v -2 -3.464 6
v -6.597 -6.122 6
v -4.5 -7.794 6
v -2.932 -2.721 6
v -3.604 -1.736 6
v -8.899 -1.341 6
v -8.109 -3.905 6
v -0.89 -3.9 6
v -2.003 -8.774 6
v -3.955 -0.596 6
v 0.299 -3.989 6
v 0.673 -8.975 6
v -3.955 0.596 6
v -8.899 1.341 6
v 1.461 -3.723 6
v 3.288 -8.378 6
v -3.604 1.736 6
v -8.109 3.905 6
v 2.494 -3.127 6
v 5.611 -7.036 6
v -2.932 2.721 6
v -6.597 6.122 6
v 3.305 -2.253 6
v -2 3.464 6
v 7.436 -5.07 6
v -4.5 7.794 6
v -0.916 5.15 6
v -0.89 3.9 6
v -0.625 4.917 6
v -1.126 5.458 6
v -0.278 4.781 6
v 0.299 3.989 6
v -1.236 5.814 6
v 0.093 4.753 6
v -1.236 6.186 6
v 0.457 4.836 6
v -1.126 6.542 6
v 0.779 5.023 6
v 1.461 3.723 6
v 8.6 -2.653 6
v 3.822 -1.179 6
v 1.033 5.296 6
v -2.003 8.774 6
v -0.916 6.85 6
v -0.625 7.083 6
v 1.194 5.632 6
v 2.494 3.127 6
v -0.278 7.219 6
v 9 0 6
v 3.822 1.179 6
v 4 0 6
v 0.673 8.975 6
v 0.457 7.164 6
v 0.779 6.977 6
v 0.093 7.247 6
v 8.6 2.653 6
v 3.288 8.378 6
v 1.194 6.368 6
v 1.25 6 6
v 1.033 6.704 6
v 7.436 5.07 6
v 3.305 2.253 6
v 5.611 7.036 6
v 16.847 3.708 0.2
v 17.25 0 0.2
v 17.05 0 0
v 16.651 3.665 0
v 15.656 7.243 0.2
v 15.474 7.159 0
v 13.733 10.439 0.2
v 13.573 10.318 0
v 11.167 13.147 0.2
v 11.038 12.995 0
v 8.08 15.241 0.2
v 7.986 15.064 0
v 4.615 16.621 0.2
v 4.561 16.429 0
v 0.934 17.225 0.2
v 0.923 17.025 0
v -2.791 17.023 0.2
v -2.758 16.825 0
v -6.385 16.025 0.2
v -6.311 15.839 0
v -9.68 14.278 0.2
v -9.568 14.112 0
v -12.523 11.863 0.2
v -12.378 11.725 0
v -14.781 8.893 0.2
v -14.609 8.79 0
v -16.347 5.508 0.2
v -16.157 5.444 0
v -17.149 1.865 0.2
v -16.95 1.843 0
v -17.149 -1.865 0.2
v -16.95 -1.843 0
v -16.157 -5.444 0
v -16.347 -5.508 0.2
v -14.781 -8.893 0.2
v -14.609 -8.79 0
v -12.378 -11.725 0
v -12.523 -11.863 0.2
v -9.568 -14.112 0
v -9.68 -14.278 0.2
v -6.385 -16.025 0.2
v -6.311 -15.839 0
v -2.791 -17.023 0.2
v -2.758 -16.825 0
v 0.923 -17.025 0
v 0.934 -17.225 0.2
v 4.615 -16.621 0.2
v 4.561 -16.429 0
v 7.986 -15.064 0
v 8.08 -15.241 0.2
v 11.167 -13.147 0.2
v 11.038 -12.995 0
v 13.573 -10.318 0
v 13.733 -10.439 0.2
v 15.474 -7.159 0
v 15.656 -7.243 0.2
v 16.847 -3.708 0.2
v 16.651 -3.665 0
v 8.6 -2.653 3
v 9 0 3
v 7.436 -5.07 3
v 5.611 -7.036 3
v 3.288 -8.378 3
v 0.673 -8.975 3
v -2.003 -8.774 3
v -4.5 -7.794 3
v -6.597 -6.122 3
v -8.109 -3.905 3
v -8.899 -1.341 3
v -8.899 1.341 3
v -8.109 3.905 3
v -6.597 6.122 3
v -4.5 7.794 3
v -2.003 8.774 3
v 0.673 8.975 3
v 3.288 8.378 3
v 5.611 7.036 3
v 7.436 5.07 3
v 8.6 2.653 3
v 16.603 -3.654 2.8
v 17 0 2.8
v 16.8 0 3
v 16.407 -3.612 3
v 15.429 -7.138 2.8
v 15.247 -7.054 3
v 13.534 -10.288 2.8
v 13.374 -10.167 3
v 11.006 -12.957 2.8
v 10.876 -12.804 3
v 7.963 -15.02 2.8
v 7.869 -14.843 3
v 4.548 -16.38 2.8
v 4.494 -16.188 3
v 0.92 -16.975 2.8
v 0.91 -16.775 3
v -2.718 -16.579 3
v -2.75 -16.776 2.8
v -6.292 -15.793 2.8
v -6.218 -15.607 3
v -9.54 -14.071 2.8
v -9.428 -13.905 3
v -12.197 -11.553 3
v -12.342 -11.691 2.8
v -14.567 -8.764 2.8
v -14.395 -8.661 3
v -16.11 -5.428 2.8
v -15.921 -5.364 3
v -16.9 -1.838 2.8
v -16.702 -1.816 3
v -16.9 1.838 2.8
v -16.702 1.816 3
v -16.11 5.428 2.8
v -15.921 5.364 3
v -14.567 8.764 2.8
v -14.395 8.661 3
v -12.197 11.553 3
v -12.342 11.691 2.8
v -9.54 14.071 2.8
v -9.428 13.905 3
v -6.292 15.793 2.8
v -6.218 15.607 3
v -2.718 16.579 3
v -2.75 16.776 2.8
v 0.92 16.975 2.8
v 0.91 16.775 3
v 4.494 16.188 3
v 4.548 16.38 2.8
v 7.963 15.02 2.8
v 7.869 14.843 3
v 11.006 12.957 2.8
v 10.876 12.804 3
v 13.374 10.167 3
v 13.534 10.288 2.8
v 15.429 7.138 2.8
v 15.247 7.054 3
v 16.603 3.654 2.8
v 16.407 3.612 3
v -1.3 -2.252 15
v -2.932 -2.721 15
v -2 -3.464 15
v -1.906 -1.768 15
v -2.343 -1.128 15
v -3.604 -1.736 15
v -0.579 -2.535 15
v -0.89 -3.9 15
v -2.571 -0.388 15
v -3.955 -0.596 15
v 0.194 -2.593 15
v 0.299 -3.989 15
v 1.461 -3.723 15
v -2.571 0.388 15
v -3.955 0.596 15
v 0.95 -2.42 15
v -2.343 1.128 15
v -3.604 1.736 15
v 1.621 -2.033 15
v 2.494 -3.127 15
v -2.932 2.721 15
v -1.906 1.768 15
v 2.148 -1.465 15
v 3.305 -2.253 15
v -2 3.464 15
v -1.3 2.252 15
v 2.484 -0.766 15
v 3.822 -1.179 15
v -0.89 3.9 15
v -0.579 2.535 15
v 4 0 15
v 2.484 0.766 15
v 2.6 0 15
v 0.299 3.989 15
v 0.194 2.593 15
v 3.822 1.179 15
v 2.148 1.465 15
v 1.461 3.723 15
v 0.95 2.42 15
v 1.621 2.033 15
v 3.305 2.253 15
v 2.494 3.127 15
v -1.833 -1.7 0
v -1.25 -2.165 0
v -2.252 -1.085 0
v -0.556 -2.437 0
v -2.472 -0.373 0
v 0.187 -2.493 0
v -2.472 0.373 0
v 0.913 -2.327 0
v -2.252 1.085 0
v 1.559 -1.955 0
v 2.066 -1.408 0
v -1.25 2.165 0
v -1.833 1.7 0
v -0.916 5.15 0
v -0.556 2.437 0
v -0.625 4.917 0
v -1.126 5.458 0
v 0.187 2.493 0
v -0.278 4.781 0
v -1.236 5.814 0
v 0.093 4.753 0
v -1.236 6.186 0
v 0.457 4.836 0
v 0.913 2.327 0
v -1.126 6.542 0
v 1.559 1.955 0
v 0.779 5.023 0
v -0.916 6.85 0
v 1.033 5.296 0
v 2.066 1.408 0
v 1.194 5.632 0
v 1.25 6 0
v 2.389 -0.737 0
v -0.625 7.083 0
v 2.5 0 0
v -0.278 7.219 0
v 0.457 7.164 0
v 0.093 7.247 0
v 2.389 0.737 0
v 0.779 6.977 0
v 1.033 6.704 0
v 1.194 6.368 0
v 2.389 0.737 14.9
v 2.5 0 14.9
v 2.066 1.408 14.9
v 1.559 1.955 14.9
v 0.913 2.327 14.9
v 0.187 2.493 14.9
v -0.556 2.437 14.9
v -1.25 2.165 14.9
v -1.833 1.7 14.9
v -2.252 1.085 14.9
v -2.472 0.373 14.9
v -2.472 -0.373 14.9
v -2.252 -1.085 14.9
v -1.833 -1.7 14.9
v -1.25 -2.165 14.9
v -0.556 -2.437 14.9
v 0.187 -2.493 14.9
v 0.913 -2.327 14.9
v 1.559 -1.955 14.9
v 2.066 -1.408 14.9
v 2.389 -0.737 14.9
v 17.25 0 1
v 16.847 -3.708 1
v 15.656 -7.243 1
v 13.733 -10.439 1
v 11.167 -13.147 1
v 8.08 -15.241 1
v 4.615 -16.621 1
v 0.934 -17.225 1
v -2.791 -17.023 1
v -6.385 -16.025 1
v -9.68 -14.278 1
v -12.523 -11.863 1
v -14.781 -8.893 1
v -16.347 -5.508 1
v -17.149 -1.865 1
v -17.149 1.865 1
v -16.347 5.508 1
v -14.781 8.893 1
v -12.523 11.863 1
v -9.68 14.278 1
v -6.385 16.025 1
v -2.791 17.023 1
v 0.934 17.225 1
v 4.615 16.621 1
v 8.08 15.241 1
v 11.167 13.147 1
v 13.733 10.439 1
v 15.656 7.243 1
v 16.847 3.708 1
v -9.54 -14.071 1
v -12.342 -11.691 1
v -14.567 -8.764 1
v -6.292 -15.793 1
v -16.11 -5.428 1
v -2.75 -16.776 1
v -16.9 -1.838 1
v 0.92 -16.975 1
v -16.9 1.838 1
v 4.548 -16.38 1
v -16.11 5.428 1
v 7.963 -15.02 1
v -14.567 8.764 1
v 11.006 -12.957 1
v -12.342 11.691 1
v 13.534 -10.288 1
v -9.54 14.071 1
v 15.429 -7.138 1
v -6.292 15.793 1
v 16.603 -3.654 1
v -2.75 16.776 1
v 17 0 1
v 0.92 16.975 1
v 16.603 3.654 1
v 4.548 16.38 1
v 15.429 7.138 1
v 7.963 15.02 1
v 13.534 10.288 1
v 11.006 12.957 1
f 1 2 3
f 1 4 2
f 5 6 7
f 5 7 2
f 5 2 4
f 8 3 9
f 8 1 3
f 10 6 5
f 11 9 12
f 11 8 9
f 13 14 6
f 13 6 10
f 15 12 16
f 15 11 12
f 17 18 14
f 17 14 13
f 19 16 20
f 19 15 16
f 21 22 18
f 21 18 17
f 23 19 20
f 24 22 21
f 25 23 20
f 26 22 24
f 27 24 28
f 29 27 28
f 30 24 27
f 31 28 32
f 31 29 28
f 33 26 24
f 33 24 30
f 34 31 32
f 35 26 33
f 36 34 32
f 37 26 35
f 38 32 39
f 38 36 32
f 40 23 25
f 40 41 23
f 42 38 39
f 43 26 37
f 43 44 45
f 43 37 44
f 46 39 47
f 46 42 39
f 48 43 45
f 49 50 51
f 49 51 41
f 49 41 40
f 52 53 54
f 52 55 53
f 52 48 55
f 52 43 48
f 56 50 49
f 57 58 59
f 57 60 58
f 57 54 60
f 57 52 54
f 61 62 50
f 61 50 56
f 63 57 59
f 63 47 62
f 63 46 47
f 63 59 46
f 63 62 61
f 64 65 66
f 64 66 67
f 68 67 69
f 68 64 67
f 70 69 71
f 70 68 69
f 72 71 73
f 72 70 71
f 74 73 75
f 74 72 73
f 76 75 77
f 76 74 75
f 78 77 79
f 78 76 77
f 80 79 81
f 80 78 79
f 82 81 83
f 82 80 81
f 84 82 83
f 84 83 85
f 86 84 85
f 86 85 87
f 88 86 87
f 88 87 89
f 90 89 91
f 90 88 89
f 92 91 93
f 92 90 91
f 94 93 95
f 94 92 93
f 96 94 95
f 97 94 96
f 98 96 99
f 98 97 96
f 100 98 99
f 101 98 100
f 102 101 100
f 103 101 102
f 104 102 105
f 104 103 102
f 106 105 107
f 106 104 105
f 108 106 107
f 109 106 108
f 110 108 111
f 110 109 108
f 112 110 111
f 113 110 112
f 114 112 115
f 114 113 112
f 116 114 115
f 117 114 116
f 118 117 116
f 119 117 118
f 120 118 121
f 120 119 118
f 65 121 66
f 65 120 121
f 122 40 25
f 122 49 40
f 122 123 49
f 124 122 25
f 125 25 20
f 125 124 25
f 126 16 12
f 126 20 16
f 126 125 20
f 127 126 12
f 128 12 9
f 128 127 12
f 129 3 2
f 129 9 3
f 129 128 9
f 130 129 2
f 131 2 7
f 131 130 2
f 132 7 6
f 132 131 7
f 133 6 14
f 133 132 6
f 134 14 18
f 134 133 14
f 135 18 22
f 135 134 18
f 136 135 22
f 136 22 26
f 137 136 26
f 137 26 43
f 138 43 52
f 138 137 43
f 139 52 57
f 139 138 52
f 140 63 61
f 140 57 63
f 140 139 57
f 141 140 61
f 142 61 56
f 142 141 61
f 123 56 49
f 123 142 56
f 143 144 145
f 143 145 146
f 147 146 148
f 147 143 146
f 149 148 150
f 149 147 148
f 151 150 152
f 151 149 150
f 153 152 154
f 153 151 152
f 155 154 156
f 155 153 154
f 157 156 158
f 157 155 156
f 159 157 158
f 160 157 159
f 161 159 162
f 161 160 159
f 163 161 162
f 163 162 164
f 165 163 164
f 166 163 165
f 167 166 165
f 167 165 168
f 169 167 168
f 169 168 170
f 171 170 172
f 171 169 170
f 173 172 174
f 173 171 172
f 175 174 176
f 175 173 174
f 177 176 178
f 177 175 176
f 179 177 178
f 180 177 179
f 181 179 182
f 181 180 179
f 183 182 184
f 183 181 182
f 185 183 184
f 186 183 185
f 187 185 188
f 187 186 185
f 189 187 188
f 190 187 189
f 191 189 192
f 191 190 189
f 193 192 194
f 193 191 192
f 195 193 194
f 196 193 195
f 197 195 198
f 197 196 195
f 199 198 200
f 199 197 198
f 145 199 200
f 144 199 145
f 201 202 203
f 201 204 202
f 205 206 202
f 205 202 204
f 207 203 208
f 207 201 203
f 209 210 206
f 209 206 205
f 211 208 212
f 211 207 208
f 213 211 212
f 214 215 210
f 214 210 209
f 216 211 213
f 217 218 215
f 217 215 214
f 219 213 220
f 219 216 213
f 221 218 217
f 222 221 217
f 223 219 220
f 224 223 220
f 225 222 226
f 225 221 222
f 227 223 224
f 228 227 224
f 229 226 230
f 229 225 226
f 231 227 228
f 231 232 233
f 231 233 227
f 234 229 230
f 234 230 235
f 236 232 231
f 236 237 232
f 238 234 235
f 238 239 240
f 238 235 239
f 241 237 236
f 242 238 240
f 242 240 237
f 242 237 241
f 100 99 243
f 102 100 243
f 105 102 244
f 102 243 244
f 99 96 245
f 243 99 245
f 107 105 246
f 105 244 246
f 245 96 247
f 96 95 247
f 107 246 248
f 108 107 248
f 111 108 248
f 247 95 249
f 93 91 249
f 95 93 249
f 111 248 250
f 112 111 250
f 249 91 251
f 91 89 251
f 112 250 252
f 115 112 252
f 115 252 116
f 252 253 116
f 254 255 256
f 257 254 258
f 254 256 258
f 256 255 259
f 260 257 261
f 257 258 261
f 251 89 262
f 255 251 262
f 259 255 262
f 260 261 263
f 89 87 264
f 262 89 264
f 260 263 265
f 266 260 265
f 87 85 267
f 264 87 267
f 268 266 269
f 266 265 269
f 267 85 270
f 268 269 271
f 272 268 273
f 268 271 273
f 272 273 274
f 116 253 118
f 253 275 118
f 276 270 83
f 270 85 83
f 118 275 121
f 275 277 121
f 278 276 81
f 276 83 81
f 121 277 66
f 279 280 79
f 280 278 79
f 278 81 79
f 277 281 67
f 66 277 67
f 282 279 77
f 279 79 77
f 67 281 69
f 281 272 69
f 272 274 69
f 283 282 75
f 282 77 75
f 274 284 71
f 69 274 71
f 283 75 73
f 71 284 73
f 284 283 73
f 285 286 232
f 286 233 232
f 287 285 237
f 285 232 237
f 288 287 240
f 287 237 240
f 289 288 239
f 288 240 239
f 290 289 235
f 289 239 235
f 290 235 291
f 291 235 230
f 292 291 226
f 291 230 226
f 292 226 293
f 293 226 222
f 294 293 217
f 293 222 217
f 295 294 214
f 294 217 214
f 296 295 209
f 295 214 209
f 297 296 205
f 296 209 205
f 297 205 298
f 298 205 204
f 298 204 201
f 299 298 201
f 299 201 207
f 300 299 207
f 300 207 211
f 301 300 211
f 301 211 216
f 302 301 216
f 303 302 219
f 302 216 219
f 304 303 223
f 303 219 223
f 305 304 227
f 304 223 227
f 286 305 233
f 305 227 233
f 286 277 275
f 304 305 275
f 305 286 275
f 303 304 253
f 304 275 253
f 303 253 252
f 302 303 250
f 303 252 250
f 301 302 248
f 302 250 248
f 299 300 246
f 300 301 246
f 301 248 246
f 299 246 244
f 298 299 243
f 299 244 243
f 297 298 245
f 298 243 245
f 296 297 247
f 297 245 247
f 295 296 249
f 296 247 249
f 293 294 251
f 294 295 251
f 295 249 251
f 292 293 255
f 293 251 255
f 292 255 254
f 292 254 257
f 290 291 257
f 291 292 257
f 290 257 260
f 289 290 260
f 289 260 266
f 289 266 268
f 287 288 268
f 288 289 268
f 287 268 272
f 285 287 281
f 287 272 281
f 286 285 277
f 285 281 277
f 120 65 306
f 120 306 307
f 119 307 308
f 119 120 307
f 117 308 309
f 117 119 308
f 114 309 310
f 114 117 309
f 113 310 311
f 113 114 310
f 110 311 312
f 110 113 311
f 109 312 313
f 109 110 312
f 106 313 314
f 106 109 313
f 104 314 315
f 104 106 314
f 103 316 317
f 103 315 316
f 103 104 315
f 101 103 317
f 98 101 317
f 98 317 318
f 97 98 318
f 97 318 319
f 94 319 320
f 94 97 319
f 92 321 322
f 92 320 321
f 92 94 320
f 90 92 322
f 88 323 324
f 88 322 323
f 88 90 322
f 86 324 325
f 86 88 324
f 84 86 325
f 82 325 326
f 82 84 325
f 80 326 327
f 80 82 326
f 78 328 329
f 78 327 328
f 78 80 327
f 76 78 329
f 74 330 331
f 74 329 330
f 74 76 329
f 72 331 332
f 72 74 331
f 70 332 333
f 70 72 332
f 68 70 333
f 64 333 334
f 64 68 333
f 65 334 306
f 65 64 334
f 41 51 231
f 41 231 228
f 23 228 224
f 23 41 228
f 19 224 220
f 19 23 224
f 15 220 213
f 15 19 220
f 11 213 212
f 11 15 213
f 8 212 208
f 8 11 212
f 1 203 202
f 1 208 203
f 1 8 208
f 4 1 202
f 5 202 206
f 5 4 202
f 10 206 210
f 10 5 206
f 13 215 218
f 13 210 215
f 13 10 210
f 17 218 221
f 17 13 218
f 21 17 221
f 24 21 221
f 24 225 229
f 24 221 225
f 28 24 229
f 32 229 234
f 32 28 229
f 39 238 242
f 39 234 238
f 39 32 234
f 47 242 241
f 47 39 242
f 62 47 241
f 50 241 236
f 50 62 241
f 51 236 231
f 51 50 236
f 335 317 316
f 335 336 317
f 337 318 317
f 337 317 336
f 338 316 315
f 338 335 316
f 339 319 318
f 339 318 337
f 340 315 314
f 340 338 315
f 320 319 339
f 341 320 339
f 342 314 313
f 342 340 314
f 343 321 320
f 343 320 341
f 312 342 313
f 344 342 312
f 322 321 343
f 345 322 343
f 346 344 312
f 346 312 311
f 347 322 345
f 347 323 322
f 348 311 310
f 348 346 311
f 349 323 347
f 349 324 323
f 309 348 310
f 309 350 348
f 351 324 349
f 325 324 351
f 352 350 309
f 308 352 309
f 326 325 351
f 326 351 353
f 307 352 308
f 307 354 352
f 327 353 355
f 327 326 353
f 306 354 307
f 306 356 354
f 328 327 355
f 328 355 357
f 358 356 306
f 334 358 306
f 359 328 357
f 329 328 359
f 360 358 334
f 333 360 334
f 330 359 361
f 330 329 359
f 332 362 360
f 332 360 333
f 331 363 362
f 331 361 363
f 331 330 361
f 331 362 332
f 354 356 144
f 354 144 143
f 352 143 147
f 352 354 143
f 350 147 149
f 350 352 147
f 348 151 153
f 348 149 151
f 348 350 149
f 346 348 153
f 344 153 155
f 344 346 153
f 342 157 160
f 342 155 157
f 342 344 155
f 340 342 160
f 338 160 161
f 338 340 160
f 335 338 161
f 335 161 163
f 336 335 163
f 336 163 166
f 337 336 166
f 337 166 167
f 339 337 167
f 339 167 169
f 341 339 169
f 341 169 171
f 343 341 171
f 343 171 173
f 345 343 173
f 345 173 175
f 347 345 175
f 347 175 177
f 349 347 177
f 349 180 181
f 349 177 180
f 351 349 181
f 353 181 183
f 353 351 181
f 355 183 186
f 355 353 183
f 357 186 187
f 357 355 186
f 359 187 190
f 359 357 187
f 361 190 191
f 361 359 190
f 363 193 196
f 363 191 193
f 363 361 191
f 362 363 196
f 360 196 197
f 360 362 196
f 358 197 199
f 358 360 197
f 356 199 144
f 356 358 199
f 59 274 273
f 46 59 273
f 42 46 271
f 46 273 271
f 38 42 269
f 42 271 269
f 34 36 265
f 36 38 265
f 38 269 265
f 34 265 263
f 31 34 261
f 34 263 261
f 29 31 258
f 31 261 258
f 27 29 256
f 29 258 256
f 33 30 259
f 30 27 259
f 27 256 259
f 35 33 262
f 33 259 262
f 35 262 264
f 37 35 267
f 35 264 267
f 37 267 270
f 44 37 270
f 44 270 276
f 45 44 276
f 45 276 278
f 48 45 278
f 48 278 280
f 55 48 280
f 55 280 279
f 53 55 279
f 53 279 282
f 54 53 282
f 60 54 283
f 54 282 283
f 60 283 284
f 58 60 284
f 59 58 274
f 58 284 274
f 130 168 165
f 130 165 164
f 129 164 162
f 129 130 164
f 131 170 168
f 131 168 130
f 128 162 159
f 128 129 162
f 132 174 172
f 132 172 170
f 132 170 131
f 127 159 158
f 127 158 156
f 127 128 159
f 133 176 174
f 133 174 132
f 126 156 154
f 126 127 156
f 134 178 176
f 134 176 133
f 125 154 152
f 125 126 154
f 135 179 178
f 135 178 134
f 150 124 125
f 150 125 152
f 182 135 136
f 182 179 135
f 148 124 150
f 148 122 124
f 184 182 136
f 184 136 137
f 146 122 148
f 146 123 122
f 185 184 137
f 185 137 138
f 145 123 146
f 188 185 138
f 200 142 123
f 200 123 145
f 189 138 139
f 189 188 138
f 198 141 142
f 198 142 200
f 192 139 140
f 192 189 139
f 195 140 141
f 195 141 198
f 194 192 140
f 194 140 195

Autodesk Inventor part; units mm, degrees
ref_plane "YZ Plane" through (0, 0, 0) normal (1, 0, 0) x (0, 1, 0)
ref_plane "XZ Plane" through (0, 0, 0) normal (0, 1, 0) x (-1, 0, 0)
ref_plane "XY Plane" through (0, 0, 0) normal (0, 0, 1) x (1, 0, 0)
sketch "Sketch1" plane through (0, 0, 0) normal (0, 0, 1) x (1, 0, 0)
  circle A0 centre (0, 0) radius 17
  circle A1 centre (0, 0) radius 17.25
  circle A2 centre (0, 0) radius 4
  circle A3 centre (0, 0) radius 9
  circle A4 centre (0, 0) radius 2.5
  circle A5 centre (0, 6) radius 1.25
  dimension "d0" = 34
  dimension "d1" = 34.5
  dimension "d2" = 8
  dimension "d3" = 18
  dimension "d4" = 5
  dimension "d5" = 2.5
  dimension "d6" = 6
extrude "Extrusion1" add sketch "Sketch1" along normal blind 1 contours A1
extrude "Extrusion2" add sketch "Sketch1" along normal blind 3 contours A0
extrude "Extrusion3" add sketch "Sketch1" along normal blind 6 contours A3
extrude "Extrusion4" add sketch "Sketch1" along normal blind 15 contours A2
chamfer "Chamfer1" distance 0.2 angle 45 2 edges at (-17.25, 0, 0) (-17, 0, 3)
chamfer "Chamfer2" distance 0.1 angle 45 1 edges at (-2.5, 0, 15)
properties part number "HeatExchangePistonExhaust"
